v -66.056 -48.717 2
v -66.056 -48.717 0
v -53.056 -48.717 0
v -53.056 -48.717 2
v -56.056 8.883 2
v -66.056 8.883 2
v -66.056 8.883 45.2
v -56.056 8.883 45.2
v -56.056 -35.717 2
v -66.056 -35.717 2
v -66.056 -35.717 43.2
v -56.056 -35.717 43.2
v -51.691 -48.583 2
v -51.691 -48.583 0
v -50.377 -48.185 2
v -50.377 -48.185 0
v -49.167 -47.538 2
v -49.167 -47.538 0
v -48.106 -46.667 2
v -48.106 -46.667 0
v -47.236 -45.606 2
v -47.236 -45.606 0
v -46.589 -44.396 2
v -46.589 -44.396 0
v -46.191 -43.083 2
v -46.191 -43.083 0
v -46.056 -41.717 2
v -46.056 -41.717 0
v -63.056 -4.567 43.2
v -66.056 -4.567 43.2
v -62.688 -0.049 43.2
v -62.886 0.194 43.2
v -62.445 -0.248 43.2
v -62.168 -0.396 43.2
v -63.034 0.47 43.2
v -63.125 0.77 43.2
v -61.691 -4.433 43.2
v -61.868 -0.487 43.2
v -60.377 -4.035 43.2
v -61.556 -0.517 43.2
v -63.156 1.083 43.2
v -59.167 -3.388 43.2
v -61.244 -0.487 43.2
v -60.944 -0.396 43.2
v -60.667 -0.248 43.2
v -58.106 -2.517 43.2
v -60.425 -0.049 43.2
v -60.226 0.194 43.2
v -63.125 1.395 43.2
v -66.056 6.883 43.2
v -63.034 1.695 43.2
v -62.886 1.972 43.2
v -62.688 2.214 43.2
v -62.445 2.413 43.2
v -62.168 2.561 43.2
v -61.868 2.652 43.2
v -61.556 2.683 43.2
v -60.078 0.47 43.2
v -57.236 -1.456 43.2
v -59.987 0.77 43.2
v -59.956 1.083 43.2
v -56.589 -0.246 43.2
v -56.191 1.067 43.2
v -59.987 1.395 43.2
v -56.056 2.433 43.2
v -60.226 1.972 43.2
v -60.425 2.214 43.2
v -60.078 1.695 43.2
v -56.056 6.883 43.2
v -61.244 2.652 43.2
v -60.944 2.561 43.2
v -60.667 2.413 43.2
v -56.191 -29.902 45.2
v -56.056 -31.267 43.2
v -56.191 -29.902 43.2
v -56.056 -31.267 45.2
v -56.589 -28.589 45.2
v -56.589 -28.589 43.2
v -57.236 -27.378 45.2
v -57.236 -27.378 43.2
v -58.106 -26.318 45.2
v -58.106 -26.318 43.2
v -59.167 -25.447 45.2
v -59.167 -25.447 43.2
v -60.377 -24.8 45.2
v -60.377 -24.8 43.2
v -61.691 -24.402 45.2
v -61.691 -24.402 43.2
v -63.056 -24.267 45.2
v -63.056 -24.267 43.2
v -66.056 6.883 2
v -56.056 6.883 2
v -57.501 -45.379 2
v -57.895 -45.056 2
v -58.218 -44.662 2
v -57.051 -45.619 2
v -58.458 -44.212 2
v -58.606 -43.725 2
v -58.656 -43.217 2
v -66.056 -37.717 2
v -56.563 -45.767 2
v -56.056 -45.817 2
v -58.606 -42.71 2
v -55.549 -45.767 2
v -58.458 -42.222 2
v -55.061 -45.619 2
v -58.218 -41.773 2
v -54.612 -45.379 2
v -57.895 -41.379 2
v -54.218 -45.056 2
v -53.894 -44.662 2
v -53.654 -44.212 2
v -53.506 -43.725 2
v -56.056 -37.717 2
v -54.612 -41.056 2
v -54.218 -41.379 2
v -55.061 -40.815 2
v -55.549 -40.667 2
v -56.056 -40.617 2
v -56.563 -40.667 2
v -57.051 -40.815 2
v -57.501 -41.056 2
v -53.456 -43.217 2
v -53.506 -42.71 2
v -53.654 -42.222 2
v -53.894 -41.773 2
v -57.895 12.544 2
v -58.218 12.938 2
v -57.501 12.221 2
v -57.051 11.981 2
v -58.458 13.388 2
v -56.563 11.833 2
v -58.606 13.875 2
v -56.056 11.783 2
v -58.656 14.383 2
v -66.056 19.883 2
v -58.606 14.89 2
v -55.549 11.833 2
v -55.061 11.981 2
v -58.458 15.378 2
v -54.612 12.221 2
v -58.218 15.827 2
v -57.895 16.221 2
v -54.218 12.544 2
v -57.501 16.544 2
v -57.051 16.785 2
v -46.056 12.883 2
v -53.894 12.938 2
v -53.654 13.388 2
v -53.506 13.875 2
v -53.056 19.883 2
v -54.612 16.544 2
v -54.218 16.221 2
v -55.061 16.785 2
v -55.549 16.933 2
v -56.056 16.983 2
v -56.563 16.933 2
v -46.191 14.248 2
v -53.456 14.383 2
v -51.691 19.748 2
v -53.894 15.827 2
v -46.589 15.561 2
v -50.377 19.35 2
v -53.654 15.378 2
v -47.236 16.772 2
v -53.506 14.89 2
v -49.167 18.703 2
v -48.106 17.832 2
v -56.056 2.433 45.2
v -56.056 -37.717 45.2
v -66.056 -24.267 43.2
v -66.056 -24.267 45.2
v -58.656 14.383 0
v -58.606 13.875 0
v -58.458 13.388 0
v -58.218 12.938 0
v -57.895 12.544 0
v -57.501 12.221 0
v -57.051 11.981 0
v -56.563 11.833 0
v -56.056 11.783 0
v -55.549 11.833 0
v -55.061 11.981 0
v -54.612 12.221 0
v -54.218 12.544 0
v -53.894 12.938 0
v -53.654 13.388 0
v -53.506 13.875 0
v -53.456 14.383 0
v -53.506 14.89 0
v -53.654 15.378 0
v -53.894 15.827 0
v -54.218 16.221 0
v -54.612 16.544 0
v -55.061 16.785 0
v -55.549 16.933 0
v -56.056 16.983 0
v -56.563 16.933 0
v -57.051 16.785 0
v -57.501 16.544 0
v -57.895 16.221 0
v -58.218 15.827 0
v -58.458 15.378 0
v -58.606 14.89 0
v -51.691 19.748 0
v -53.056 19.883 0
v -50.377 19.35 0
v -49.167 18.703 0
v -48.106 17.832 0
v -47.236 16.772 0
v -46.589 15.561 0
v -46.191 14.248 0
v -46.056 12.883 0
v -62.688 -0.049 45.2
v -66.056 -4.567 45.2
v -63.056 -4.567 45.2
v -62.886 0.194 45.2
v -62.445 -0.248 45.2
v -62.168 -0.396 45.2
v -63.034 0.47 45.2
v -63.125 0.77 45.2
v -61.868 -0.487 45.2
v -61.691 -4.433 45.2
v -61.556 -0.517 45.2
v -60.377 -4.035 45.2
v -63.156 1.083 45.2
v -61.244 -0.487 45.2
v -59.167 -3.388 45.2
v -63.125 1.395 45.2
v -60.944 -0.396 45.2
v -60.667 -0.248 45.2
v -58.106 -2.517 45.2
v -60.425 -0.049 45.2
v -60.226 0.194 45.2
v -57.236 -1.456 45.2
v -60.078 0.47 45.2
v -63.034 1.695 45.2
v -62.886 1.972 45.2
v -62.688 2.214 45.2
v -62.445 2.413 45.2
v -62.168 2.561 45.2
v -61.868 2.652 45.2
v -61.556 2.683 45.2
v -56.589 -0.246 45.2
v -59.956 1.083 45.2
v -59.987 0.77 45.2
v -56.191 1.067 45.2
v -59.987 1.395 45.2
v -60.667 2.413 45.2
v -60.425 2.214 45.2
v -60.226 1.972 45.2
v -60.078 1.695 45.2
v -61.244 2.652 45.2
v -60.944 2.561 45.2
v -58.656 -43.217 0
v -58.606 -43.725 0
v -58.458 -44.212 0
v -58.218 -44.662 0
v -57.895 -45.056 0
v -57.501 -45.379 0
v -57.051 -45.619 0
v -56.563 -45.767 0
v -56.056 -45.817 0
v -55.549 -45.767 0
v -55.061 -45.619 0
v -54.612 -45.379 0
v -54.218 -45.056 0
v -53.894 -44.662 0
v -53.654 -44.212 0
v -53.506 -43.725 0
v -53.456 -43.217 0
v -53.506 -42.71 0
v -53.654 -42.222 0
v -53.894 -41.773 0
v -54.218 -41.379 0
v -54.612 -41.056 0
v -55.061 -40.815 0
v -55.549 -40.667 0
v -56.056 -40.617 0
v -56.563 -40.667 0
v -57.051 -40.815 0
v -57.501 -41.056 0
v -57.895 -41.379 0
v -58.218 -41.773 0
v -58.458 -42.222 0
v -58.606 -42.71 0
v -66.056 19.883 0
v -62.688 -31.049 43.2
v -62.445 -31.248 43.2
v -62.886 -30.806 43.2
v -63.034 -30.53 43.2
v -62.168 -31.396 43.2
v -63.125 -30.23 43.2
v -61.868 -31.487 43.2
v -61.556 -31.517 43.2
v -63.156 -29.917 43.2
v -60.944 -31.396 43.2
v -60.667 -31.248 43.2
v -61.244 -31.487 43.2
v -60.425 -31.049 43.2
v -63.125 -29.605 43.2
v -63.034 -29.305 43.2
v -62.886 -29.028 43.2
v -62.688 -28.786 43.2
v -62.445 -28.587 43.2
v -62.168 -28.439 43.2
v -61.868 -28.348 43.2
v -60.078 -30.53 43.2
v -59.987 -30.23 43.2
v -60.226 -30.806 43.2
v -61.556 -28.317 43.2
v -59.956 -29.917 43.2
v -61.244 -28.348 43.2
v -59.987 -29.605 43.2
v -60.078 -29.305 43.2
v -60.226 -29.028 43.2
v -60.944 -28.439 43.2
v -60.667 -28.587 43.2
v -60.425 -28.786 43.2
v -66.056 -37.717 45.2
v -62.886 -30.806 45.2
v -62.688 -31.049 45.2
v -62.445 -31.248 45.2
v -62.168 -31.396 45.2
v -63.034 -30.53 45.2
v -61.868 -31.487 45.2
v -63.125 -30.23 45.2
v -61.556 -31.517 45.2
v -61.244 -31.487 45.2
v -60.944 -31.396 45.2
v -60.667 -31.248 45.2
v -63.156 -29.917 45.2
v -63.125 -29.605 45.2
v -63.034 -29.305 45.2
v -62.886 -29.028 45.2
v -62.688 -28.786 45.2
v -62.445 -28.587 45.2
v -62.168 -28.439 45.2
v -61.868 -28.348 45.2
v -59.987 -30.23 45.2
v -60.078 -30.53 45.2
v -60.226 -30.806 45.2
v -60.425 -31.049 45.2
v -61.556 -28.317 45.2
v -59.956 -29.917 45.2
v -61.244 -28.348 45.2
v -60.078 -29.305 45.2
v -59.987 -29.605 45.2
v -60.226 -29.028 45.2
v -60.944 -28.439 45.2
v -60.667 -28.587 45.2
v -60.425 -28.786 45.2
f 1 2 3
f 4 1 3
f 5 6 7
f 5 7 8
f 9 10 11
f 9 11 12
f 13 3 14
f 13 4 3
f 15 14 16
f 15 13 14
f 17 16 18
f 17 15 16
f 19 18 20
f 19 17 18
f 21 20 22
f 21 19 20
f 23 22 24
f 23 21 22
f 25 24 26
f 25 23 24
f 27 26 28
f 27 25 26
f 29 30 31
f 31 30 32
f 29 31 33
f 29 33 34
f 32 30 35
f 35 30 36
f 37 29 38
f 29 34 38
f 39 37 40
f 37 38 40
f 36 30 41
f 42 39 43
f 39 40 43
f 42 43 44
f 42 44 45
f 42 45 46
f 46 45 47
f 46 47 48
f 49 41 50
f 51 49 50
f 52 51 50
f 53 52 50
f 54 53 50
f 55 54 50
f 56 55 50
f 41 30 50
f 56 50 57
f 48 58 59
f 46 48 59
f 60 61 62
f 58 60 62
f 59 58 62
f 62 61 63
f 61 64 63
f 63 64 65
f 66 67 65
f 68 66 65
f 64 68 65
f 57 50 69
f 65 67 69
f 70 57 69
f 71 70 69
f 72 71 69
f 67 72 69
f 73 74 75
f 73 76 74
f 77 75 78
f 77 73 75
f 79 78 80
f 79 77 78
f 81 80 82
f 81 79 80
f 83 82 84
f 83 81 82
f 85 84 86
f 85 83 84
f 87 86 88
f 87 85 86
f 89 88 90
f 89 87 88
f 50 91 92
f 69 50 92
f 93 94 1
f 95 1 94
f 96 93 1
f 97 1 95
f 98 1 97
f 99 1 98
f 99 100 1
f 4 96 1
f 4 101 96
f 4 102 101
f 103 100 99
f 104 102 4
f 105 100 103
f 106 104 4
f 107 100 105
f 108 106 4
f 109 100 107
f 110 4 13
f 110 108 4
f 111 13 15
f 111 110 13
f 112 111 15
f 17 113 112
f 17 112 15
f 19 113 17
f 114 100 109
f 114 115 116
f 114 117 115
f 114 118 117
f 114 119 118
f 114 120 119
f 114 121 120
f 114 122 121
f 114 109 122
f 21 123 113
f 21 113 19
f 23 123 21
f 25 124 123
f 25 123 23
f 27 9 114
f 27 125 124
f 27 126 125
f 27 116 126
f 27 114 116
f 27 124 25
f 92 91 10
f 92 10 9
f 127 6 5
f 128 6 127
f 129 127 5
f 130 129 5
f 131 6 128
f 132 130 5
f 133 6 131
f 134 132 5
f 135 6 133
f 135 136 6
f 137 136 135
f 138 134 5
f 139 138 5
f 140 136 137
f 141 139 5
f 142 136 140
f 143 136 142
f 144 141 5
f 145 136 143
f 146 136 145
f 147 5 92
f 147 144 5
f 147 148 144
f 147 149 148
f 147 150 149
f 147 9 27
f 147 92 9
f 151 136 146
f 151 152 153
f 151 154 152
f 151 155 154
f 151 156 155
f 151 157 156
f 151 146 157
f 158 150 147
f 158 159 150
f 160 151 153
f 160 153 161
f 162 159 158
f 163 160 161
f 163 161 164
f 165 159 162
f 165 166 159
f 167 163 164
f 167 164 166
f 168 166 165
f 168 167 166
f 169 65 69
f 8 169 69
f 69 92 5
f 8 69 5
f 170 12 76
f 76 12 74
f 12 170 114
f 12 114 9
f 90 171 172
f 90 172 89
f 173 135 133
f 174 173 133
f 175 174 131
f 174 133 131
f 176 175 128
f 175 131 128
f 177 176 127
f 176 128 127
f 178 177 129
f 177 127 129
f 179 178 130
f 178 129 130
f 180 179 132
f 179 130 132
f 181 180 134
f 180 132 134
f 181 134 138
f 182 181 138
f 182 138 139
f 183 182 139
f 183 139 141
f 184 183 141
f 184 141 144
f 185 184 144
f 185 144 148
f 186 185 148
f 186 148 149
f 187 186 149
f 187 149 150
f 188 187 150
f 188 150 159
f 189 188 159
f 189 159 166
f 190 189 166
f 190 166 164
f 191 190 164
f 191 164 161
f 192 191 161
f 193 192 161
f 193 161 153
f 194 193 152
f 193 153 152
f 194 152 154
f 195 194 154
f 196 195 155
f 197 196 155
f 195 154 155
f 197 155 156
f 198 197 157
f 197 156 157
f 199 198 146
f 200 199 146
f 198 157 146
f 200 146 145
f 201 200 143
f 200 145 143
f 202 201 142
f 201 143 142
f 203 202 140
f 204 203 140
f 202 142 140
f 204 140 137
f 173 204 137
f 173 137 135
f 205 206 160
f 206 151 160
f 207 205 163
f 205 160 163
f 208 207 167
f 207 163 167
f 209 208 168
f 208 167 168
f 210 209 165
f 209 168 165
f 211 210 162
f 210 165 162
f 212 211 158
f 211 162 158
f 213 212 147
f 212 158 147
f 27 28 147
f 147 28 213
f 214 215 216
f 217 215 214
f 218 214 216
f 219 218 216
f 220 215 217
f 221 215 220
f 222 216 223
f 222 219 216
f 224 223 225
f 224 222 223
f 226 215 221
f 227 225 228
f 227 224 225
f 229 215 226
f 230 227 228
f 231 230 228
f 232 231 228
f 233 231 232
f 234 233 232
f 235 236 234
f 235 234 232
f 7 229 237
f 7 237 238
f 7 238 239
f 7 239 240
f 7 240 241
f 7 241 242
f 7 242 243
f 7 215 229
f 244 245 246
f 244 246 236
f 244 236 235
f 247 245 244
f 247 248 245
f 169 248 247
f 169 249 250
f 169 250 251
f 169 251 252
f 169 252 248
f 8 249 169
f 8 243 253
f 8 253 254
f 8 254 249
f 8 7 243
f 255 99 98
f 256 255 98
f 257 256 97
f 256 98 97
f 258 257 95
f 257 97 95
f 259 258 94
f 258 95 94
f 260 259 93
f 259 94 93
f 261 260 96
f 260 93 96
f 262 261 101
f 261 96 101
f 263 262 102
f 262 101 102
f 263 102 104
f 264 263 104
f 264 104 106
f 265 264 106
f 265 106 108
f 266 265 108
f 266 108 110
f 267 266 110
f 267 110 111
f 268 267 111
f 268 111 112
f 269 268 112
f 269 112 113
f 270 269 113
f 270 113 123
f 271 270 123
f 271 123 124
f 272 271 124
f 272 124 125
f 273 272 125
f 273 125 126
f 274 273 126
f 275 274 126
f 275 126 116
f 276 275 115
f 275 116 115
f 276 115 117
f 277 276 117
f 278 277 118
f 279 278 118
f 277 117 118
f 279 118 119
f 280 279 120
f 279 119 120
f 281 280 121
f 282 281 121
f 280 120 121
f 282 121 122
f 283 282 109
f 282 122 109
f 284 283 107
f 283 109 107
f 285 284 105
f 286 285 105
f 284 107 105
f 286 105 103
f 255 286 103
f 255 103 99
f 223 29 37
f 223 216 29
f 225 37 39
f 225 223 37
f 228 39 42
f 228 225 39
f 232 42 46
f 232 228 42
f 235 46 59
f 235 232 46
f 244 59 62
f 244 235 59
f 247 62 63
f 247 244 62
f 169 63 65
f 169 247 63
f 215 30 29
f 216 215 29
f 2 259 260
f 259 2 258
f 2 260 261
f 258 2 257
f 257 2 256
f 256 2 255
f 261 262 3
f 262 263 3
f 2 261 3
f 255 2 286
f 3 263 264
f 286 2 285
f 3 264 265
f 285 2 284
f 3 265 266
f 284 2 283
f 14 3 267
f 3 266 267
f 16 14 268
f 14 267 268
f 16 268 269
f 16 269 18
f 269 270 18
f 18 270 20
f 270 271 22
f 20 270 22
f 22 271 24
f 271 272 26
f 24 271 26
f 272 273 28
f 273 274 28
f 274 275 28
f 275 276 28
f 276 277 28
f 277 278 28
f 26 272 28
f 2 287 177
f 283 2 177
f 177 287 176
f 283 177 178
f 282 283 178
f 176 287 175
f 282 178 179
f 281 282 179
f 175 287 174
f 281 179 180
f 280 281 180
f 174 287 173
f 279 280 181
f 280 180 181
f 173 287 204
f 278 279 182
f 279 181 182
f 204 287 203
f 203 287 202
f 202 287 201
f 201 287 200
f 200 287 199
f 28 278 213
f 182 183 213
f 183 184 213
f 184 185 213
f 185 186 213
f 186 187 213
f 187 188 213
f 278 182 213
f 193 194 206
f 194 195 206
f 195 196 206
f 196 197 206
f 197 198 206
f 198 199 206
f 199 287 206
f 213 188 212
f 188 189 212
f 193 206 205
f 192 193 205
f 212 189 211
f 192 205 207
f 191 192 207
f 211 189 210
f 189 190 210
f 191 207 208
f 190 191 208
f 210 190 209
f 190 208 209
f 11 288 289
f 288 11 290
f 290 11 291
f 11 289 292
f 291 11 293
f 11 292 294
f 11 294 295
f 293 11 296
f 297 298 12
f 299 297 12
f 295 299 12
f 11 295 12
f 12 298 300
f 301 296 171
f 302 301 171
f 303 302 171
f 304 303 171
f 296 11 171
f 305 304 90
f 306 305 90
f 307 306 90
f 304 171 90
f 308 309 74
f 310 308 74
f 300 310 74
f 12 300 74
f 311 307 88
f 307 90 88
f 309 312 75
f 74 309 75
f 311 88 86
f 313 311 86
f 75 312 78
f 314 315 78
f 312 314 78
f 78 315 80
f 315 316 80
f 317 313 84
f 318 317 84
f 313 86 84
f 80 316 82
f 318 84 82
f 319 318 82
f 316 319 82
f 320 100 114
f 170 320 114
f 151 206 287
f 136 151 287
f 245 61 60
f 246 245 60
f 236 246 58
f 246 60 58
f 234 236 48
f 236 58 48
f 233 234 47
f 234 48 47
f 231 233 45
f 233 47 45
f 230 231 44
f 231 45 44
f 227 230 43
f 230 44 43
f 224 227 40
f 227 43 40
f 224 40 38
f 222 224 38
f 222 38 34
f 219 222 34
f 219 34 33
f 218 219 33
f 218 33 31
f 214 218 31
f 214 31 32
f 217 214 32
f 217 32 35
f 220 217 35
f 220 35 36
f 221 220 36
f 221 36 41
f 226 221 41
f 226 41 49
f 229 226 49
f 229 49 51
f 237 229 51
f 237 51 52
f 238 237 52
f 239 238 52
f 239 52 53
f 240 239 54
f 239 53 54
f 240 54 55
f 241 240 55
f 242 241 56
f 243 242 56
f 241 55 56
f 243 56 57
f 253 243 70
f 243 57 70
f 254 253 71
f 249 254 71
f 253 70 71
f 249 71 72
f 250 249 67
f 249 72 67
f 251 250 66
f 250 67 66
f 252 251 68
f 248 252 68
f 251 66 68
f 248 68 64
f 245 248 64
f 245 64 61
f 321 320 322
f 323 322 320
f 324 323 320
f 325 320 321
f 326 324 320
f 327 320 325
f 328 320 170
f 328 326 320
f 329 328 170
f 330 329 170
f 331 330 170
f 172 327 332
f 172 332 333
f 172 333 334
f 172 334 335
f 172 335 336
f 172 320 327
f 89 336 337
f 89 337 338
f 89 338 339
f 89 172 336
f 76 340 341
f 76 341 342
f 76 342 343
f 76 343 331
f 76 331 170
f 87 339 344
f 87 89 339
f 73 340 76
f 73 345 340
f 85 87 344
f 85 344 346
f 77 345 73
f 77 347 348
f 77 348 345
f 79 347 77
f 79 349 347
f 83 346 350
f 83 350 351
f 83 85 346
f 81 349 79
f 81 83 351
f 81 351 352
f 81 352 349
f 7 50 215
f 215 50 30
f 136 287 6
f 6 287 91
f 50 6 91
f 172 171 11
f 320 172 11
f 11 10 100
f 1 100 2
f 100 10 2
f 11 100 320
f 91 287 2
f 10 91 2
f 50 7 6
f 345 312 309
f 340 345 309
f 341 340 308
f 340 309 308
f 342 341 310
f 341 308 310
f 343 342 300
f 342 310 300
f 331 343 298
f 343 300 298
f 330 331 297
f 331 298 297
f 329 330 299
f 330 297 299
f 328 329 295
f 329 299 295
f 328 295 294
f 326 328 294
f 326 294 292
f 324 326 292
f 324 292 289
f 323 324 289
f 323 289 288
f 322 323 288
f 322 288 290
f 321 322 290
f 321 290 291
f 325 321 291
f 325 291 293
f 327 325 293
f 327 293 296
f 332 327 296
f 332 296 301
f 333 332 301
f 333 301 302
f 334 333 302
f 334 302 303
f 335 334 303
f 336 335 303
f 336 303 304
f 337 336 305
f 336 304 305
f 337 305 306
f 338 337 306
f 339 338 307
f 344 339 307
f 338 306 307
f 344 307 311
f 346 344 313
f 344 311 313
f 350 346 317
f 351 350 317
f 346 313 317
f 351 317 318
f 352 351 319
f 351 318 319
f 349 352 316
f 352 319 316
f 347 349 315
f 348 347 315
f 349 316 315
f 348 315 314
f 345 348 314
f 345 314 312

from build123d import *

# Parameters (mm, degrees)
F0_W     = 10
F0_H     = 42.6
F1_DEPTH = 2
F0_H_2   = 2
F2_DEPTH = 43.2
F3_W     = 10
F3_H     = 2
F3_H_2   = 13.45
F3_H_3   = 11.45
F4_DEPTH = 2
F5_D     = 3.2
F5_DEPTH = 2.001
F6_D     = 5.2
F7_R     = 7


with BuildPart() as f1:
    # F0 (on Top) → F1 (new body)
    with BuildSketch(Plane.XY):
        with Locations((-61.0561398208, -14.4174070306)):
            Rectangle(F0_W, F0_H)
        Polygon((-61.0561398208, -48.7174070306), (-51.0561398208, -48.7174070306), (-51.0561398208, -37.7174070306), (-56.0561398208, -37.7174070306), (-66.0561398208, -37.7174070306), (-66.0561398208, -48.7174070306), align=None)
        Polygon((-51.0561398208, 19.8825929694), (-61.0561398208, 19.8825929694), (-66.0561398208, 19.8825929694), (-66.0561398208, 8.8825929694), (-56.0561398208, 8.8825929694), (-51.0561398208, 8.8825929694), align=None)
        Polygon((-46.0561398208, 19.8825929694), (-51.0561398208, 19.8825929694), (-51.0561398208, 8.8825929694), (-56.0561398208, 8.8825929694), (-56.0561398208, 6.8825929694), (-56.0561398208, -35.7174070306), (-56.0561398208, -37.7174070306), (-51.0561398208, -37.7174070306), (-51.0561398208, -48.7174070306), (-46.0561398208, -48.7174070306), align=None)
    extrude(amount=F1_DEPTH)

    # F0 (on Top) → F2 (join)
    with BuildSketch(Plane.XY):
        with Locations((-61.0561398208, -36.7174070306)):
            Rectangle(F0_W, F0_H_2)
        with Locations((-61.0561398208, 7.8825929694)):
            Rectangle(F0_W, F0_H_2)
    extrude(amount=F2_DEPTH)

    # F3 (on face) → F4 (join)
    with BuildSketch(Plane.XY.offset(43.2)):
        with Locations((-61.0561398208, -36.7174070306)):
            Rectangle(F3_W, F3_H)
        with Locations((-61.0561398208, 2.1575929694)):
            Rectangle(F3_W, F3_H_2)
        with Locations((-61.0561398208, -29.9924070306)):
            Rectangle(F3_W, F3_H_3)
    extrude(amount=F4_DEPTH)

    # F5 (through all, one way)
    with BuildSketch(Plane(origin=(0, 0, 43.2), x_dir=(1, 0, 0), z_dir=(0, 0, -1))):
        with Locations((-61.5561398208, -1.0825929694), (-61.5561398208, 29.9174070306)):
            Circle(F5_D / 2)
    extrude(amount=-F5_DEPTH, mode=Mode.SUBTRACT)

    # F6 (through all)
    with Locations(Plane(origin=(0, 0, 0), x_dir=(1, 0, 0), z_dir=(0, 0, -1))):
        with Locations((-56.0561398208, -14.3825929694), (-56.0561398208, 43.2174070306)):
            Hole(F6_D / 2)

    # F7
    f7_edges = [f1.edges().sort_by_distance(p)[0] for p in [
        (-56.05614, -4.567407, 44.2),
        (-56.05614, -24.267407, 44.2),
        (-46.05614, 19.882593, 1),
        (-46.05614, -48.717407, 1),
    ]]
    fillet(f7_edges, radius=F7_R)


solid = f1.part
